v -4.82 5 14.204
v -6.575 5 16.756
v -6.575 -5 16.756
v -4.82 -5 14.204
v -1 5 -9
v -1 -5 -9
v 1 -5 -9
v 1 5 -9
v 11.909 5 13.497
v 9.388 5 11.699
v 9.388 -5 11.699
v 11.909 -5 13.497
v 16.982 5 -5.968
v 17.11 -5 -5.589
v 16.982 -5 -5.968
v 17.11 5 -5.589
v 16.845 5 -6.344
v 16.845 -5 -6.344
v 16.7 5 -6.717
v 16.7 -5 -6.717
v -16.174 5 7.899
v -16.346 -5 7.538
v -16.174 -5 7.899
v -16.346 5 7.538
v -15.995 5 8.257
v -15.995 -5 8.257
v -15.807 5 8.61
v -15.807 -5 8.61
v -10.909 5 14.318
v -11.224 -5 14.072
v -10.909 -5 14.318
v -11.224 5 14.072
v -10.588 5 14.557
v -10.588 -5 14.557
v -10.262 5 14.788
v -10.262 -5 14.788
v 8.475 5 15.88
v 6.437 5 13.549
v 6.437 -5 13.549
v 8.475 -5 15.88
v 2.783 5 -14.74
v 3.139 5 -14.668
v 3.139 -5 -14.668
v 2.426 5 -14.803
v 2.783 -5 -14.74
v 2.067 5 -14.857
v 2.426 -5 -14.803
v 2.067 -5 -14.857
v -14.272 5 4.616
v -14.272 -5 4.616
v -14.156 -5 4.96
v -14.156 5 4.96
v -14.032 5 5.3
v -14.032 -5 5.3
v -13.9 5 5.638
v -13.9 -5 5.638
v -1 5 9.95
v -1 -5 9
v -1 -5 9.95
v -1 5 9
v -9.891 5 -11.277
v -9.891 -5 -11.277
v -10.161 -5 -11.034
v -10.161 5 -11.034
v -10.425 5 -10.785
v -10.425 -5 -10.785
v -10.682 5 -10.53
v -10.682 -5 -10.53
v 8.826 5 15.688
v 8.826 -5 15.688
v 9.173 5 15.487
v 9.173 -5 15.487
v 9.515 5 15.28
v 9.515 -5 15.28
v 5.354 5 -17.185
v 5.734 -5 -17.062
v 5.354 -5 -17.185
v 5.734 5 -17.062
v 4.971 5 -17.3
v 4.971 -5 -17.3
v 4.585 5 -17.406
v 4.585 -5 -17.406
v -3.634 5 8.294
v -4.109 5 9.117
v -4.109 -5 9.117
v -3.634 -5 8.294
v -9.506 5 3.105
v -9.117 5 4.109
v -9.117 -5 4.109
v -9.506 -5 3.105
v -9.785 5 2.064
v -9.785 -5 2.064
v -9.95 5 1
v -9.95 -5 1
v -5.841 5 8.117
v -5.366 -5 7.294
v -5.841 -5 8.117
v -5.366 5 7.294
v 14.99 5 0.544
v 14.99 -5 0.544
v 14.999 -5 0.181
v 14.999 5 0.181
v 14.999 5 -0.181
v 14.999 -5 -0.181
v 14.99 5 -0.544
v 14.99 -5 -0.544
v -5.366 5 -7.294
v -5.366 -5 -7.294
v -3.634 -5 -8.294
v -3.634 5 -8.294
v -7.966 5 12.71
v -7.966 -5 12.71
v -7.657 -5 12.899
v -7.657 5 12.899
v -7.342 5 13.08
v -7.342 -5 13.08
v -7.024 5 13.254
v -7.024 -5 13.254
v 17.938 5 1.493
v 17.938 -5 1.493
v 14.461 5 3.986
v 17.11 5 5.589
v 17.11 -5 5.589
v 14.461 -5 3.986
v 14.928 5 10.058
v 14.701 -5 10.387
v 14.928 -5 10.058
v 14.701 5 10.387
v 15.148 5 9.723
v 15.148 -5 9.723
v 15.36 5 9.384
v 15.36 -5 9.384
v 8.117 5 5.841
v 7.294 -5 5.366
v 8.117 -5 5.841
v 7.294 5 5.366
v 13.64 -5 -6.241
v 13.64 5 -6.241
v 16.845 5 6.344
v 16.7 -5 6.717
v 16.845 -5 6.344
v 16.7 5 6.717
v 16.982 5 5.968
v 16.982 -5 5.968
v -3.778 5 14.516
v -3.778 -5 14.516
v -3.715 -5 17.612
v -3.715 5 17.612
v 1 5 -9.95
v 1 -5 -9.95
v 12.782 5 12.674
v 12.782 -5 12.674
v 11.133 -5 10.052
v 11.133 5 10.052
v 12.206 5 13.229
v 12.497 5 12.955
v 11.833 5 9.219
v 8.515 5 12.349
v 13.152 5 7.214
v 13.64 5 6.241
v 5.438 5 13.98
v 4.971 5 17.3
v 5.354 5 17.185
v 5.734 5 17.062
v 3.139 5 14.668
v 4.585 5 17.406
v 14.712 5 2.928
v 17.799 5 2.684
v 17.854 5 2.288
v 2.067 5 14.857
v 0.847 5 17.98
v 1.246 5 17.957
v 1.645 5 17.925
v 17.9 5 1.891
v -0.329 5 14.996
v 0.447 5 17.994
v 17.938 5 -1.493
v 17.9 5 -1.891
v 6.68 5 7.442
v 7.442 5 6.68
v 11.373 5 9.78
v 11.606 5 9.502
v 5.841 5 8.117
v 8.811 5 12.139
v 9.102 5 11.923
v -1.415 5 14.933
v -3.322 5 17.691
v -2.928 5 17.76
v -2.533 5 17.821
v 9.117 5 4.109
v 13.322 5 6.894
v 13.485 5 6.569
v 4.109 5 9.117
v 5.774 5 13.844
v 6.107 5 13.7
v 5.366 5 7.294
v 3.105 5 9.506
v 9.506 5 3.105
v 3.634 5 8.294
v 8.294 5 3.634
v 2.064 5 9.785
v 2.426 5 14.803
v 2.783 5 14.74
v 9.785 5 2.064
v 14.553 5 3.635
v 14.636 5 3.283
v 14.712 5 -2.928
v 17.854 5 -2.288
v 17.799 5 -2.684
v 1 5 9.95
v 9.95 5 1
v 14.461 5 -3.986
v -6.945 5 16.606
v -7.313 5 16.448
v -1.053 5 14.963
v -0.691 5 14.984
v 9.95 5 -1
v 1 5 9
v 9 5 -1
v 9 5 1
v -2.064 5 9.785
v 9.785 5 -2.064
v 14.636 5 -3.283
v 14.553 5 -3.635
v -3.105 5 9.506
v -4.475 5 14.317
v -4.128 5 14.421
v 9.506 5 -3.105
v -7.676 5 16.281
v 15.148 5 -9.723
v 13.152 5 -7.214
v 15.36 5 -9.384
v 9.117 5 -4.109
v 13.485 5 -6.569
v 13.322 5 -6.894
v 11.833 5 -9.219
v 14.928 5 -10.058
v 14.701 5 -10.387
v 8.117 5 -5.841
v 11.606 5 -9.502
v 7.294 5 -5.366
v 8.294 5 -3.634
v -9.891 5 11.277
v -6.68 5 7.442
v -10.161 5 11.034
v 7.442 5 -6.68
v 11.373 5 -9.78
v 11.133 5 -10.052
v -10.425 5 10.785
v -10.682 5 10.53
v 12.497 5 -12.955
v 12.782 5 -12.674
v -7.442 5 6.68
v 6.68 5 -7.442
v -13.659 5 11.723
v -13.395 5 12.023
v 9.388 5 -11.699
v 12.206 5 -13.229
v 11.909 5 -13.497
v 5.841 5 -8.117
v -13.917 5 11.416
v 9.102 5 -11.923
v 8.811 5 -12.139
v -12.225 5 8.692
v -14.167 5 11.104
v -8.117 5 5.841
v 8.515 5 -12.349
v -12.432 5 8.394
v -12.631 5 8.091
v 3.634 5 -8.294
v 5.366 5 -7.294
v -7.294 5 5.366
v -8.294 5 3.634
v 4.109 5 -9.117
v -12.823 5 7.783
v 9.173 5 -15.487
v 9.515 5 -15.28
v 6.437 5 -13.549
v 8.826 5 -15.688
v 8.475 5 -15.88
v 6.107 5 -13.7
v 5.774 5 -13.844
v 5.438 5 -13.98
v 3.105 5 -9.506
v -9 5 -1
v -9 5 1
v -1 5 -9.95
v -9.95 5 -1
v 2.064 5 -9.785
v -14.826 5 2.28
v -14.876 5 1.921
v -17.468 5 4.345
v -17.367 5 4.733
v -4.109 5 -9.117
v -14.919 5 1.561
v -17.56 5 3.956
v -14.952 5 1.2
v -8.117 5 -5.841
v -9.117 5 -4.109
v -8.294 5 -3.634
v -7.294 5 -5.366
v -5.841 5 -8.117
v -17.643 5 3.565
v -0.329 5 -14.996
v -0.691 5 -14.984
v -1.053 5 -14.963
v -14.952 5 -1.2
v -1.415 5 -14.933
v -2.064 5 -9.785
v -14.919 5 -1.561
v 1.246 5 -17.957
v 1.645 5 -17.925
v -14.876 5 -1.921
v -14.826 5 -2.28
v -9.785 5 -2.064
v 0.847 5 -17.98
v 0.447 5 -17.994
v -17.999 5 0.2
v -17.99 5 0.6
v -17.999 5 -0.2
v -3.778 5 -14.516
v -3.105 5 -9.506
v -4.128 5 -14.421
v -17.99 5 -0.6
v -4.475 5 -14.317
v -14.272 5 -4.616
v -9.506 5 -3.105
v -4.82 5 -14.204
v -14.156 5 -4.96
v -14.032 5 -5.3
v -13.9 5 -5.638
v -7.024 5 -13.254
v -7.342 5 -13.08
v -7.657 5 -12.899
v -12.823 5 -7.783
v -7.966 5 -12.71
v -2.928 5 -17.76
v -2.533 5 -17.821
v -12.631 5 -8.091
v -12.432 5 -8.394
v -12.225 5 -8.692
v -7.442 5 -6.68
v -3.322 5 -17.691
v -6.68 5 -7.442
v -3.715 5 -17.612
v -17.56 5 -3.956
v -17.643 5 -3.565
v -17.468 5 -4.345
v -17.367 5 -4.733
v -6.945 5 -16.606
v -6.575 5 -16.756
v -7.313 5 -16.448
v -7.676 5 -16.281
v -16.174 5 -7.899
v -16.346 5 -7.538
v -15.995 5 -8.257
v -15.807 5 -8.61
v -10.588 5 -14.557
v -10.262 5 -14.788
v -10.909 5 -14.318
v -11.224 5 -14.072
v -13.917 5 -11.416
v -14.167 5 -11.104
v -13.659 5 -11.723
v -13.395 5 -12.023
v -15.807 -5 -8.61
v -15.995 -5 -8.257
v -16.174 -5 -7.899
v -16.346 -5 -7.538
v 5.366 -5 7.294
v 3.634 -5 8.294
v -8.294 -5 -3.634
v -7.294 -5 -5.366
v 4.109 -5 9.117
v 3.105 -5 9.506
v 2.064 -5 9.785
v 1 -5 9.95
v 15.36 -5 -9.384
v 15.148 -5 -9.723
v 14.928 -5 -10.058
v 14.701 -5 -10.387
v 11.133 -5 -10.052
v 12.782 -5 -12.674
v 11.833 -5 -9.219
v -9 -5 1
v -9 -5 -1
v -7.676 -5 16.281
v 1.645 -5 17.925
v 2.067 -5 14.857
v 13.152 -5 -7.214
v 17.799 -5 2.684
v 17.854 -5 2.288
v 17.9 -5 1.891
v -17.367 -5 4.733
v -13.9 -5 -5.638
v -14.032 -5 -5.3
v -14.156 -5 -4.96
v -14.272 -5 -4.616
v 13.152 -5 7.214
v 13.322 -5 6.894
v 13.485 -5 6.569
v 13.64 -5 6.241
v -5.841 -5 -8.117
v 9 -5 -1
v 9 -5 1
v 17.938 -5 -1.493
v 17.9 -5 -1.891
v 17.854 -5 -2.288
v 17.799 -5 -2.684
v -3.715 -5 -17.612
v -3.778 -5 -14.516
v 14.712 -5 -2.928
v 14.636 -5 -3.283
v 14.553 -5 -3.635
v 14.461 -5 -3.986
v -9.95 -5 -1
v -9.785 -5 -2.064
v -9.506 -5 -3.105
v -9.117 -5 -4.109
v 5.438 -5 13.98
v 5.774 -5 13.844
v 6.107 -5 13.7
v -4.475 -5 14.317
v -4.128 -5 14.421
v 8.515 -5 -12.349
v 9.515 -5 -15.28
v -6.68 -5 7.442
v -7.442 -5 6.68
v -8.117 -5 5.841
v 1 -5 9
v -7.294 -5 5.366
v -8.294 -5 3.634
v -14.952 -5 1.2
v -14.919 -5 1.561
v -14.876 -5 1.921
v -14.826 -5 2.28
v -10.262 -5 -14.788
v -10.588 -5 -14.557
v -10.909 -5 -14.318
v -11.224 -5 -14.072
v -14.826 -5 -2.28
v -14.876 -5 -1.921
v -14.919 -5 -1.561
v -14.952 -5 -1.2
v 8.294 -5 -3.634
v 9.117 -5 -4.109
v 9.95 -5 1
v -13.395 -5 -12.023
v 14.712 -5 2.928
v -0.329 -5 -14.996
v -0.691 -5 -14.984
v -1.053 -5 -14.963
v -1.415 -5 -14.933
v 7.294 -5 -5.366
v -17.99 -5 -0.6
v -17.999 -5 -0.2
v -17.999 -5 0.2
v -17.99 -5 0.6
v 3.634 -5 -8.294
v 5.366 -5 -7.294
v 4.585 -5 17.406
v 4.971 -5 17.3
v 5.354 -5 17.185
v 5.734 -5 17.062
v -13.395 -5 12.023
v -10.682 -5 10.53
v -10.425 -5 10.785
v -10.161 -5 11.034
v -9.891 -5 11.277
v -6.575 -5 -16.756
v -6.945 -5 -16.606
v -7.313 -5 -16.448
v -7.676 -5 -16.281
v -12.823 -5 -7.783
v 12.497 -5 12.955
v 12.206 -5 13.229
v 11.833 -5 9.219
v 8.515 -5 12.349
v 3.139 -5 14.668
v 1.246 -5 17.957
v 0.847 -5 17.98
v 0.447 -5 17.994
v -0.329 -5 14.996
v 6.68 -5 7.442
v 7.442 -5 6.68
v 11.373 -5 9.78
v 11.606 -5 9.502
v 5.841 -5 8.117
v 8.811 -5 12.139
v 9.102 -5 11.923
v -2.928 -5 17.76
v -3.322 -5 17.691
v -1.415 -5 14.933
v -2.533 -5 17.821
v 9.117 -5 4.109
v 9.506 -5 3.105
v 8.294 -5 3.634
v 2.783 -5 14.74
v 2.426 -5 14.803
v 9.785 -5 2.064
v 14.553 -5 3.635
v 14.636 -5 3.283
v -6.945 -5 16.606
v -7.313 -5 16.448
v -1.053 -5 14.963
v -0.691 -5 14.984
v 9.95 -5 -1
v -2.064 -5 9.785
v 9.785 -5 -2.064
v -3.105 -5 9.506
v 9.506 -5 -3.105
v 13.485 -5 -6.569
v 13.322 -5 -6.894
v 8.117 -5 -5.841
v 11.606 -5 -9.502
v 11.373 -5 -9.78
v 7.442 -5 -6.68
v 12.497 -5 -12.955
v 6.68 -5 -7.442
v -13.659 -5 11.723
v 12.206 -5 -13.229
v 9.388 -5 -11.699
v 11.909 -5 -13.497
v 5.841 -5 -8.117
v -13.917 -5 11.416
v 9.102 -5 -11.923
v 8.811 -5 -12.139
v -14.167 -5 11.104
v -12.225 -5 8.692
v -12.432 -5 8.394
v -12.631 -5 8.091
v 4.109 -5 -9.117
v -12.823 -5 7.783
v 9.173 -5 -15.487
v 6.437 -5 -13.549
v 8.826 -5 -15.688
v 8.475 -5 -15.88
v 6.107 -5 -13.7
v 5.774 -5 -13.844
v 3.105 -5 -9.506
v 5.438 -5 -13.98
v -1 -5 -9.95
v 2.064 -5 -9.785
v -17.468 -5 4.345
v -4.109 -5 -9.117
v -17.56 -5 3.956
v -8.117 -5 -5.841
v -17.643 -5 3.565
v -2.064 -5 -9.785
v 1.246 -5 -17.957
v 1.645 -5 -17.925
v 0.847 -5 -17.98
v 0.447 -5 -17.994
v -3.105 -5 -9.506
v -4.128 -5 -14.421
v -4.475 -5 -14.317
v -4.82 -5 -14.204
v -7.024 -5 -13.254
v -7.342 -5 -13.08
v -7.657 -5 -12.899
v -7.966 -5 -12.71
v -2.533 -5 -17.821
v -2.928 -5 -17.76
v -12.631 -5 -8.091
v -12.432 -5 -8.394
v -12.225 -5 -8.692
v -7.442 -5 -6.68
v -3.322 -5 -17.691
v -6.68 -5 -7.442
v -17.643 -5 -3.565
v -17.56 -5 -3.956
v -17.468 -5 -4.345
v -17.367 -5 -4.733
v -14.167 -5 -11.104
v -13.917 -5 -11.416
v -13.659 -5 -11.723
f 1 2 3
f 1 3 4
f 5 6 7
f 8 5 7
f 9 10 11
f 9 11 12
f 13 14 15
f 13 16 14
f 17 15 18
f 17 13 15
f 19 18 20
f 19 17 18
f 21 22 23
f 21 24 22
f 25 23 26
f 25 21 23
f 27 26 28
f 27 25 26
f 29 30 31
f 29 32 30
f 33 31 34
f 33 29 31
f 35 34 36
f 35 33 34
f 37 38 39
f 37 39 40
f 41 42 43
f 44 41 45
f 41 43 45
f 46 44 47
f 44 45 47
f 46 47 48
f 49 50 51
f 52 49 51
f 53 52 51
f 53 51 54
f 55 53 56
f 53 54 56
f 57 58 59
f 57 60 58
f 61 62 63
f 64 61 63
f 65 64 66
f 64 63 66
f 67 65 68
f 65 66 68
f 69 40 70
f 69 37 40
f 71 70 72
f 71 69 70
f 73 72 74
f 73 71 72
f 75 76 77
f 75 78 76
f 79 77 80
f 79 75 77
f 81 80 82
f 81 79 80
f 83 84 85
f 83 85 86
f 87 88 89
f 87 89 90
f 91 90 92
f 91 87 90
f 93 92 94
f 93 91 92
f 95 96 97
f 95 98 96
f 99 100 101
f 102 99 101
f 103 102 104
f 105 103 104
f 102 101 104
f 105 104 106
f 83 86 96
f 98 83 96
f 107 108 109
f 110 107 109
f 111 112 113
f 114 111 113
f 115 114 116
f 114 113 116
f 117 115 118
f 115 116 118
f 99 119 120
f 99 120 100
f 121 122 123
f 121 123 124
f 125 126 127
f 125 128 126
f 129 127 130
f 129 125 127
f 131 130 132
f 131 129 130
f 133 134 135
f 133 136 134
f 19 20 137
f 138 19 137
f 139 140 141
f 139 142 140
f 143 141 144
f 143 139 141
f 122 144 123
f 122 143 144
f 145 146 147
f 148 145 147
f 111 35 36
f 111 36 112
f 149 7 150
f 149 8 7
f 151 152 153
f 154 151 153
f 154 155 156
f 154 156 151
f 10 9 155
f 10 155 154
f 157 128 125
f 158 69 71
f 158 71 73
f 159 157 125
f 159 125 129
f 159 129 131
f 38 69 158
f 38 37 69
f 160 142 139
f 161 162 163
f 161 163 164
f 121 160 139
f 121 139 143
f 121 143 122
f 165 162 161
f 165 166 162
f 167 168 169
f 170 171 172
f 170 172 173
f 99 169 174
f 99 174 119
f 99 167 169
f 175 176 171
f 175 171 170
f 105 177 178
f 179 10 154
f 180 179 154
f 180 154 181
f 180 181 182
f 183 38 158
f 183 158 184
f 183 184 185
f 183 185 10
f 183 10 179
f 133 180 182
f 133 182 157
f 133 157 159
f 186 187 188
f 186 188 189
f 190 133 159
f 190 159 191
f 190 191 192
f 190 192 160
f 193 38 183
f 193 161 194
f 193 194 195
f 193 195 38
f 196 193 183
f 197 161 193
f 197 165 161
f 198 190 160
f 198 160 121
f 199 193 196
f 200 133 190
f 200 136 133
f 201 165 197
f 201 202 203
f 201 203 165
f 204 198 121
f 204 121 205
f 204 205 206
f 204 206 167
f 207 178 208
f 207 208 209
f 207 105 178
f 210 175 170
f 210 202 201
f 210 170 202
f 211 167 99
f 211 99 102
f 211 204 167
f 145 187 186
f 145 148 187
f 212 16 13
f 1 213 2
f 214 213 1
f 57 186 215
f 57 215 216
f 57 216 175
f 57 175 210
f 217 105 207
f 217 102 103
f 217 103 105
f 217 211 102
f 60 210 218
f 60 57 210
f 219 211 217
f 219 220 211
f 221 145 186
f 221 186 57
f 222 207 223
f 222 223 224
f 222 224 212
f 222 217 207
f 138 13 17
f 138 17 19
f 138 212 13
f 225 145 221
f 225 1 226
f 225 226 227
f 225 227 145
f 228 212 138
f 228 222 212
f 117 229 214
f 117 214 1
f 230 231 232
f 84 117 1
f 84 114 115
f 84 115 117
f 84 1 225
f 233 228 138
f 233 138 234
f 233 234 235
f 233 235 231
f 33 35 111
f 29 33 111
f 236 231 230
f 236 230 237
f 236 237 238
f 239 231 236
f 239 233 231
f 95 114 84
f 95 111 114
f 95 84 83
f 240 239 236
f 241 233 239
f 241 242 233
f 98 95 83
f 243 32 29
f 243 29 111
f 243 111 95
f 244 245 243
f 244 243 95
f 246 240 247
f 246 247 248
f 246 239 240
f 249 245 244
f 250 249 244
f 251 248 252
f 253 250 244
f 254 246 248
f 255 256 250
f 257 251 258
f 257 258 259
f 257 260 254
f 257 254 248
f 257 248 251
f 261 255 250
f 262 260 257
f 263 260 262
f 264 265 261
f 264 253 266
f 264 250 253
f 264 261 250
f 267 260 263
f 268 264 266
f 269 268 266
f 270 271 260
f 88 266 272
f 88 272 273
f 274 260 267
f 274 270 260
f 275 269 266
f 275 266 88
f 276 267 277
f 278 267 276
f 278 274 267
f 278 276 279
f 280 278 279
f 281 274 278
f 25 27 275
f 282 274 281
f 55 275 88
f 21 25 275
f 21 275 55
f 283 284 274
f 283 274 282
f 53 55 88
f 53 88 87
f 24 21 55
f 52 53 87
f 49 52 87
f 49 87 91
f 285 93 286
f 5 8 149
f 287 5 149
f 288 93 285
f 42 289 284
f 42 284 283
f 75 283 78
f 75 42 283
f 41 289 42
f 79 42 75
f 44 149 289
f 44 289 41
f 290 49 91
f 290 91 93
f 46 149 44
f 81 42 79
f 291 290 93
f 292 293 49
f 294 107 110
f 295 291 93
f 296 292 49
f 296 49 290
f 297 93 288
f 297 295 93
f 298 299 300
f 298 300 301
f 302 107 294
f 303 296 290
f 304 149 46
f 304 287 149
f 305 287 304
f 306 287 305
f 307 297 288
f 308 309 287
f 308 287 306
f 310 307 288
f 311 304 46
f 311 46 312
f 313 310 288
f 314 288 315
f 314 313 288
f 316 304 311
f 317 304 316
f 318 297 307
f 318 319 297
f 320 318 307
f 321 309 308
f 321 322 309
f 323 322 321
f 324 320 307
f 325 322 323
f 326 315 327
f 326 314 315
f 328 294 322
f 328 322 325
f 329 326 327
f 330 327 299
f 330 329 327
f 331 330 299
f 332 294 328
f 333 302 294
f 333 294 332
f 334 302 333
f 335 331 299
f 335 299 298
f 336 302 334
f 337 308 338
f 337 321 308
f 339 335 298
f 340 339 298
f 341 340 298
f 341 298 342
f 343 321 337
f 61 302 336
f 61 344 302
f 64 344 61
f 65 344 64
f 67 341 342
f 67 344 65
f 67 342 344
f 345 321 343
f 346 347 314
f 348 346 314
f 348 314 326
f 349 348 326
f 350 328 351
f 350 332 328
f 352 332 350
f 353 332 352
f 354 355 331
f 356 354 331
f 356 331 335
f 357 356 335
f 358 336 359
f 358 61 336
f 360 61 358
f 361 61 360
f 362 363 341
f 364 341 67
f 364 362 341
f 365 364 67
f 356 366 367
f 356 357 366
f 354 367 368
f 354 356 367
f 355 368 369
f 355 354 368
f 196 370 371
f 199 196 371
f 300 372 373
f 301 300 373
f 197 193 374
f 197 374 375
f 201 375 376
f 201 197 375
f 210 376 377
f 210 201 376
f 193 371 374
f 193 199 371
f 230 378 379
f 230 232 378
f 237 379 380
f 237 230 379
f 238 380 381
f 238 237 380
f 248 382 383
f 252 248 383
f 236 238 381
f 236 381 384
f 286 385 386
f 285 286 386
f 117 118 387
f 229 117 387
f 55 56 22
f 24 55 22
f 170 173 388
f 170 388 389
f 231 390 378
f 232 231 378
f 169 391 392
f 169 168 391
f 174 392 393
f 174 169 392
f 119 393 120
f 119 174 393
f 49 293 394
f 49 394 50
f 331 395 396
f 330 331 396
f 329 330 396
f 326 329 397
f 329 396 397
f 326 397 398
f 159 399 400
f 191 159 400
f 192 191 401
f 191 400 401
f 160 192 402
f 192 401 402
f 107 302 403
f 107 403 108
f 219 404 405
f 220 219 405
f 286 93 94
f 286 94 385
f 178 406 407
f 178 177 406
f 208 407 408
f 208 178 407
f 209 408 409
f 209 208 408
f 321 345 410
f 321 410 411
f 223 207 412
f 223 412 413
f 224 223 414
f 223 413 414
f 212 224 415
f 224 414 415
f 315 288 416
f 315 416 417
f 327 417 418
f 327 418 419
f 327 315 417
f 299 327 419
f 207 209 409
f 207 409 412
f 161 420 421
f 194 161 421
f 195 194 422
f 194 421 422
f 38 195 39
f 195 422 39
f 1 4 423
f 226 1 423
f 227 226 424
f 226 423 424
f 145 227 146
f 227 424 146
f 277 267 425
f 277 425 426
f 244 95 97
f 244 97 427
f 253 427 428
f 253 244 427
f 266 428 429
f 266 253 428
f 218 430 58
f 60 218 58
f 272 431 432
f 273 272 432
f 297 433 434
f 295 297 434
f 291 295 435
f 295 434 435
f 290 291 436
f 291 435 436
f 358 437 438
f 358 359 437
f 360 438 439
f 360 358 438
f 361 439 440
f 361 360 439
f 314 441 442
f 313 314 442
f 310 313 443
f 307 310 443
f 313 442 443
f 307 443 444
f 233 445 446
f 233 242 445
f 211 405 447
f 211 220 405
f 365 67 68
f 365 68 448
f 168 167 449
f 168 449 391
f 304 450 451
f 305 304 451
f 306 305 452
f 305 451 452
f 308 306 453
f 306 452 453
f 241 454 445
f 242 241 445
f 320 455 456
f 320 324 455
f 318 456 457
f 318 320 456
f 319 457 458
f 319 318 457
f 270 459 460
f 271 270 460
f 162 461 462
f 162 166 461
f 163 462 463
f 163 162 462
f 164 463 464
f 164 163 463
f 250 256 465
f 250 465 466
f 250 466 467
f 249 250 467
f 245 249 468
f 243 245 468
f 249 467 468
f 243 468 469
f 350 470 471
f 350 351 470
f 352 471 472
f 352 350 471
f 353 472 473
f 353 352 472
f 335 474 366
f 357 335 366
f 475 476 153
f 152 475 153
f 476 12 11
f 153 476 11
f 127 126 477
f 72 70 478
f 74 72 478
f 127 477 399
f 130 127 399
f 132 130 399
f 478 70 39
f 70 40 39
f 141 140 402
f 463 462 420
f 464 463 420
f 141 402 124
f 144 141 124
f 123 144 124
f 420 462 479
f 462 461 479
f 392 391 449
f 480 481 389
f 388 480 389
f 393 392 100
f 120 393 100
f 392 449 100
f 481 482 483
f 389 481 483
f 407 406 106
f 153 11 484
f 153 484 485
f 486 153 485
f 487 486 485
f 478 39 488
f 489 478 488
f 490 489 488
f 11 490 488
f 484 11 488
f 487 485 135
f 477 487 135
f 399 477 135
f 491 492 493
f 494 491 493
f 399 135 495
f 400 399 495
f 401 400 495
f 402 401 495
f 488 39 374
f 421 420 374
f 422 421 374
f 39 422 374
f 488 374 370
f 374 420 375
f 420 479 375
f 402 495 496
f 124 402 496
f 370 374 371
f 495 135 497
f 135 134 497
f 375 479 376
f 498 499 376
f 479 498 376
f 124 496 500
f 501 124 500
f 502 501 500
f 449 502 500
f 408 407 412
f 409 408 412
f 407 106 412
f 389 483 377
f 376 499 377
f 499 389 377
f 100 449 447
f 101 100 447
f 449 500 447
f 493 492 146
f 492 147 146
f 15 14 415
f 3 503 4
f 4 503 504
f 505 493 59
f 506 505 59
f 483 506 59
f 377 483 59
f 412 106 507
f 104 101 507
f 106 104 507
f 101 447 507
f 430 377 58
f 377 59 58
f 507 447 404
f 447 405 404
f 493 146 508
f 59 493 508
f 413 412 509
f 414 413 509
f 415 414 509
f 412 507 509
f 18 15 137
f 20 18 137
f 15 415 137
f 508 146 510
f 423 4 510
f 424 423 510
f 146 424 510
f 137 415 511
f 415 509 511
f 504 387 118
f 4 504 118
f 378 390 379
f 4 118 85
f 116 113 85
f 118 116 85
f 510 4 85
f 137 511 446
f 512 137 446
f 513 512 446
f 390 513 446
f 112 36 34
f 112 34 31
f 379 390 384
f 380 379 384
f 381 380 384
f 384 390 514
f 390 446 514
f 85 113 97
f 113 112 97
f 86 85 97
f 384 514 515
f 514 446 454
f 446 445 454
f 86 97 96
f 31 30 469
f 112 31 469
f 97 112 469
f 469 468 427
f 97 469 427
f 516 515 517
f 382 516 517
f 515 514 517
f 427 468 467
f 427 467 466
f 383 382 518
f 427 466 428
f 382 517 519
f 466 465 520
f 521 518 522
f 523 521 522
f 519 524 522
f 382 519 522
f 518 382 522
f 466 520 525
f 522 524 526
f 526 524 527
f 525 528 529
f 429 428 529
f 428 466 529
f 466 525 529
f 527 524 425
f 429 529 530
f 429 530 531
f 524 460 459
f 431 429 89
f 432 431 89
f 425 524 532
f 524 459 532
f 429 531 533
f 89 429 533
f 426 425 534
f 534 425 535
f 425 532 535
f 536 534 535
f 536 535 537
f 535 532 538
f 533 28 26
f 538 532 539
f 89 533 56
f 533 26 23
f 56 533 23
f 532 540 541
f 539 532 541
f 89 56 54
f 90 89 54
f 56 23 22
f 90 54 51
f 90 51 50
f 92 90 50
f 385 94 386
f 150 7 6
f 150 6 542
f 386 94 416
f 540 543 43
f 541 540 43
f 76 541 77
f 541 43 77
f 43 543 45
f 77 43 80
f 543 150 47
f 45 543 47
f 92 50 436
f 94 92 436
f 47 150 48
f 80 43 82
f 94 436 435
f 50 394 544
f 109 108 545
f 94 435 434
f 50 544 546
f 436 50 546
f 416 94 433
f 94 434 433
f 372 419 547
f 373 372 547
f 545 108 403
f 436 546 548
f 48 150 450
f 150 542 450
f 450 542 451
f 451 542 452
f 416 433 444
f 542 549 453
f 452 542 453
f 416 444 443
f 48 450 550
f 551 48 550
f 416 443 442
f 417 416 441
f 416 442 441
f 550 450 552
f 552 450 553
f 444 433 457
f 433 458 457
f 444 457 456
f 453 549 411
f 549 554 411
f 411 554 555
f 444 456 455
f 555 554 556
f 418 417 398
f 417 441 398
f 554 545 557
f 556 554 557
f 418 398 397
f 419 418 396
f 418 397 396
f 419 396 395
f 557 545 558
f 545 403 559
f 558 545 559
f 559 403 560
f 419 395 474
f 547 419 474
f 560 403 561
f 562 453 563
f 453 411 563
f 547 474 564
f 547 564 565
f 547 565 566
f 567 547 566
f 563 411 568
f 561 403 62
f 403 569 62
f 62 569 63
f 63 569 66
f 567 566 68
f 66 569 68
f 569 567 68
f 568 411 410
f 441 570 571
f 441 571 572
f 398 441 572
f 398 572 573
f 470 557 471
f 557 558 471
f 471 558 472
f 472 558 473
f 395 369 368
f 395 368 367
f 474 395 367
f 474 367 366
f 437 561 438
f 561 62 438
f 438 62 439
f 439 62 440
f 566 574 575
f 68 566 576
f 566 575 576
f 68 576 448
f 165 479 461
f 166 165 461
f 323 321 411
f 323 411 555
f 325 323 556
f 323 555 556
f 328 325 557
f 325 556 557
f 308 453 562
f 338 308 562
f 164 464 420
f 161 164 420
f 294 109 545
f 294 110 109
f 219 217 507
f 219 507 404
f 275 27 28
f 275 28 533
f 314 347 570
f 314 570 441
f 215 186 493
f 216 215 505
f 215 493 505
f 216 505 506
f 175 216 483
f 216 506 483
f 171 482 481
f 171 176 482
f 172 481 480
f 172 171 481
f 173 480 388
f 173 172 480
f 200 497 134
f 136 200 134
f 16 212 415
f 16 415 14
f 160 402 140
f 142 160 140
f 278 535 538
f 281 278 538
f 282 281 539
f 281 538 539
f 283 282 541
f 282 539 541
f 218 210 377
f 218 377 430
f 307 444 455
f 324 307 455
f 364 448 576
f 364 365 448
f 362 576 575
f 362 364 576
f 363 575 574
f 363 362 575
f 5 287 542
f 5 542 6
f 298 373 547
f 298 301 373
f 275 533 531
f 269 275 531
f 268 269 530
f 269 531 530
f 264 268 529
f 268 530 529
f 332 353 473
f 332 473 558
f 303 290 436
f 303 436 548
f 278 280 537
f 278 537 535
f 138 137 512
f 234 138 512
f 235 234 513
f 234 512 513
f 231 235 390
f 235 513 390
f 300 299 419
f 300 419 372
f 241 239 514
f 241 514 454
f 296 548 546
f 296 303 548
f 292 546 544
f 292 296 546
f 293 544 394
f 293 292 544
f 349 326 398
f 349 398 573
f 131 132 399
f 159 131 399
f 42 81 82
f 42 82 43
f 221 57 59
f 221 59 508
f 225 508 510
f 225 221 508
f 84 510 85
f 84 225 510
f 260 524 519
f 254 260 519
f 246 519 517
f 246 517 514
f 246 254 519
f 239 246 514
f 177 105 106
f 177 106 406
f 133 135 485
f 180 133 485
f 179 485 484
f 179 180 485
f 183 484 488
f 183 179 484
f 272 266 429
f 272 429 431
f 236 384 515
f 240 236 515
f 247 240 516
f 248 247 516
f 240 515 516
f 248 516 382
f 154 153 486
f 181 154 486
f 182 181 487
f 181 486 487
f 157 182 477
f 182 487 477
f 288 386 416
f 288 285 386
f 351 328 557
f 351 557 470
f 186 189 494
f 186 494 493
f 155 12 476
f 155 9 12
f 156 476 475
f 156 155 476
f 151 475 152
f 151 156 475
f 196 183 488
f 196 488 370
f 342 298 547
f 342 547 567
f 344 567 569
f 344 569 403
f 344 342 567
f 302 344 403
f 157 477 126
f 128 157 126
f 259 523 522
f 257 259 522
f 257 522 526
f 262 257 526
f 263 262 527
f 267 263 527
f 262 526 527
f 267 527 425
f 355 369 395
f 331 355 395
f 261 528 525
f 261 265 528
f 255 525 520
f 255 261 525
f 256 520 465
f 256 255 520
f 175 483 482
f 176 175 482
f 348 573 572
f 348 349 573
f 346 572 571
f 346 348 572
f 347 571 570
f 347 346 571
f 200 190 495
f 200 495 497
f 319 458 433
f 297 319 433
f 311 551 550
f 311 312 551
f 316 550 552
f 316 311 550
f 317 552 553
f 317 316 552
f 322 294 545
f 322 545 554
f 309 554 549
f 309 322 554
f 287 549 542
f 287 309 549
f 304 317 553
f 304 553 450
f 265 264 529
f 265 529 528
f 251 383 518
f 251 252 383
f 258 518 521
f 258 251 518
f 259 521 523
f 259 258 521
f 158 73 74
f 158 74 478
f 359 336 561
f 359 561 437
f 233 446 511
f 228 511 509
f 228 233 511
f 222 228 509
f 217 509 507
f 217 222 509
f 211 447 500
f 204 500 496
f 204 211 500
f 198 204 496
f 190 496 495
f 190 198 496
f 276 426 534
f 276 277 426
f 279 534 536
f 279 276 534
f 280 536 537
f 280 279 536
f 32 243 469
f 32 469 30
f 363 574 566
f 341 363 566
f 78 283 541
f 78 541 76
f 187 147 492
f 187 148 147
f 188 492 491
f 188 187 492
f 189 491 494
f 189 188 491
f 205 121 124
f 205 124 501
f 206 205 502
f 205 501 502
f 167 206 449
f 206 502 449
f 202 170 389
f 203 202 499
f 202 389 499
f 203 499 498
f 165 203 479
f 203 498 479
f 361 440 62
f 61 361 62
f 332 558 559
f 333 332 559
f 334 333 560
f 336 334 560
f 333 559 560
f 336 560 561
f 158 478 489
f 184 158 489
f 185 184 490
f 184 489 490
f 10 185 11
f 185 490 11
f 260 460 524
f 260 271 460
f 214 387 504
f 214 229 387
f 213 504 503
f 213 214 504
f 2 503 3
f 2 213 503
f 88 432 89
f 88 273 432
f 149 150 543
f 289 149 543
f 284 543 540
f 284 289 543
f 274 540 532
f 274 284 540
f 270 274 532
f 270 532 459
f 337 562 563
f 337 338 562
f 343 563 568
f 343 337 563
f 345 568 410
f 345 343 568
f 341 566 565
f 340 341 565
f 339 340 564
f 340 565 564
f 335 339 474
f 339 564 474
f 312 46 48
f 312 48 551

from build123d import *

# Parameters (mm, degrees)
SKETCH1_R           = 15
SKETCH1_R_2         = 10
BOSS_EXTRUDE1_DEPTH = 5
BOSS_EXTRUDE2_DEPTH = 5
BOSS_EXTRUDE3_DEPTH = 5
CIRPATTERN1_COUNT   = 12
CIRPATTERN2_COUNT   = 27


with BuildPart() as part:
    # Sketch1 → Boss-Extrude1 (new, symmetric)
    with BuildSketch(Plane(origin=(0, 0, 0), x_dir=(-1, 0, 0), z_dir=(0, 1, 0))):
        Circle(SKETCH1_R)
        Circle(SKETCH1_R_2, mode=Mode.SUBTRACT)
    extrude(amount=BOSS_EXTRUDE1_DEPTH, both=True)

    # Sketch1<3> → Boss-Extrude2 (add, symmetric)
    with BuildSketch(Plane(origin=(0, 0, 0), x_dir=(-1, 0, 0), z_dir=(0, 1, 0))):
        with BuildLine():
            ThreePointArc((17.989997221, -0.6), (18, 0), (17.989997221, 0.6))
            Line((17.989997221, 0.6), (14.951922953, 1.2))
            ThreePointArc((14.951922953, 1.2), (14.987975919, 0.600481349), (15, 0))
            ThreePointArc((15, 0), (14.987975919, -0.600481349), (14.951922953, -1.2))
            Line((14.951922953, -1.2), (17.989997221, -0.6))
        make_face()
    boss_extrude2 = extrude(amount=BOSS_EXTRUDE2_DEPTH, both=True)

    # Sketch1<4> → Boss-Extrude3 (add, symmetric)
    with BuildSketch(Plane(origin=(0, 0, 0), x_dir=(-1, 0, 0), z_dir=(0, 1, 0))):
        with BuildLine():
            ThreePointArc((1, 9.949874371), (0.500627751, 9.987460731), (0, 10))
            ThreePointArc((0, 10), (-0.500627751, 9.987460731), (-1, 9.949874371))
            Line((-1, 9.949874371), (-1, 9))
            Line((-1, 9), (1, 9))
            Line((1, 9), (1, 9.949874371))
        make_face()
    boss_extrude3 = extrude(amount=BOSS_EXTRUDE3_DEPTH, both=True)

    # CirPattern1: Boss-Extrude3 ×12 about axis
    cirpattern1_axis = Axis((0, 5, 0), (0, 1, 0))
    for i in range(1, CIRPATTERN1_COUNT):
        add(boss_extrude3.rotate(cirpattern1_axis, i * 360 / CIRPATTERN1_COUNT))

    # CirPattern2: Boss-Extrude2 ×27 about axis
    cirpattern2_axis = Axis((0, -5, 0), (0, 1, 0))
    for i in range(1, CIRPATTERN2_COUNT):
        add(boss_extrude2.rotate(cirpattern2_axis, i * 360 / CIRPATTERN2_COUNT))


solid = part.part
